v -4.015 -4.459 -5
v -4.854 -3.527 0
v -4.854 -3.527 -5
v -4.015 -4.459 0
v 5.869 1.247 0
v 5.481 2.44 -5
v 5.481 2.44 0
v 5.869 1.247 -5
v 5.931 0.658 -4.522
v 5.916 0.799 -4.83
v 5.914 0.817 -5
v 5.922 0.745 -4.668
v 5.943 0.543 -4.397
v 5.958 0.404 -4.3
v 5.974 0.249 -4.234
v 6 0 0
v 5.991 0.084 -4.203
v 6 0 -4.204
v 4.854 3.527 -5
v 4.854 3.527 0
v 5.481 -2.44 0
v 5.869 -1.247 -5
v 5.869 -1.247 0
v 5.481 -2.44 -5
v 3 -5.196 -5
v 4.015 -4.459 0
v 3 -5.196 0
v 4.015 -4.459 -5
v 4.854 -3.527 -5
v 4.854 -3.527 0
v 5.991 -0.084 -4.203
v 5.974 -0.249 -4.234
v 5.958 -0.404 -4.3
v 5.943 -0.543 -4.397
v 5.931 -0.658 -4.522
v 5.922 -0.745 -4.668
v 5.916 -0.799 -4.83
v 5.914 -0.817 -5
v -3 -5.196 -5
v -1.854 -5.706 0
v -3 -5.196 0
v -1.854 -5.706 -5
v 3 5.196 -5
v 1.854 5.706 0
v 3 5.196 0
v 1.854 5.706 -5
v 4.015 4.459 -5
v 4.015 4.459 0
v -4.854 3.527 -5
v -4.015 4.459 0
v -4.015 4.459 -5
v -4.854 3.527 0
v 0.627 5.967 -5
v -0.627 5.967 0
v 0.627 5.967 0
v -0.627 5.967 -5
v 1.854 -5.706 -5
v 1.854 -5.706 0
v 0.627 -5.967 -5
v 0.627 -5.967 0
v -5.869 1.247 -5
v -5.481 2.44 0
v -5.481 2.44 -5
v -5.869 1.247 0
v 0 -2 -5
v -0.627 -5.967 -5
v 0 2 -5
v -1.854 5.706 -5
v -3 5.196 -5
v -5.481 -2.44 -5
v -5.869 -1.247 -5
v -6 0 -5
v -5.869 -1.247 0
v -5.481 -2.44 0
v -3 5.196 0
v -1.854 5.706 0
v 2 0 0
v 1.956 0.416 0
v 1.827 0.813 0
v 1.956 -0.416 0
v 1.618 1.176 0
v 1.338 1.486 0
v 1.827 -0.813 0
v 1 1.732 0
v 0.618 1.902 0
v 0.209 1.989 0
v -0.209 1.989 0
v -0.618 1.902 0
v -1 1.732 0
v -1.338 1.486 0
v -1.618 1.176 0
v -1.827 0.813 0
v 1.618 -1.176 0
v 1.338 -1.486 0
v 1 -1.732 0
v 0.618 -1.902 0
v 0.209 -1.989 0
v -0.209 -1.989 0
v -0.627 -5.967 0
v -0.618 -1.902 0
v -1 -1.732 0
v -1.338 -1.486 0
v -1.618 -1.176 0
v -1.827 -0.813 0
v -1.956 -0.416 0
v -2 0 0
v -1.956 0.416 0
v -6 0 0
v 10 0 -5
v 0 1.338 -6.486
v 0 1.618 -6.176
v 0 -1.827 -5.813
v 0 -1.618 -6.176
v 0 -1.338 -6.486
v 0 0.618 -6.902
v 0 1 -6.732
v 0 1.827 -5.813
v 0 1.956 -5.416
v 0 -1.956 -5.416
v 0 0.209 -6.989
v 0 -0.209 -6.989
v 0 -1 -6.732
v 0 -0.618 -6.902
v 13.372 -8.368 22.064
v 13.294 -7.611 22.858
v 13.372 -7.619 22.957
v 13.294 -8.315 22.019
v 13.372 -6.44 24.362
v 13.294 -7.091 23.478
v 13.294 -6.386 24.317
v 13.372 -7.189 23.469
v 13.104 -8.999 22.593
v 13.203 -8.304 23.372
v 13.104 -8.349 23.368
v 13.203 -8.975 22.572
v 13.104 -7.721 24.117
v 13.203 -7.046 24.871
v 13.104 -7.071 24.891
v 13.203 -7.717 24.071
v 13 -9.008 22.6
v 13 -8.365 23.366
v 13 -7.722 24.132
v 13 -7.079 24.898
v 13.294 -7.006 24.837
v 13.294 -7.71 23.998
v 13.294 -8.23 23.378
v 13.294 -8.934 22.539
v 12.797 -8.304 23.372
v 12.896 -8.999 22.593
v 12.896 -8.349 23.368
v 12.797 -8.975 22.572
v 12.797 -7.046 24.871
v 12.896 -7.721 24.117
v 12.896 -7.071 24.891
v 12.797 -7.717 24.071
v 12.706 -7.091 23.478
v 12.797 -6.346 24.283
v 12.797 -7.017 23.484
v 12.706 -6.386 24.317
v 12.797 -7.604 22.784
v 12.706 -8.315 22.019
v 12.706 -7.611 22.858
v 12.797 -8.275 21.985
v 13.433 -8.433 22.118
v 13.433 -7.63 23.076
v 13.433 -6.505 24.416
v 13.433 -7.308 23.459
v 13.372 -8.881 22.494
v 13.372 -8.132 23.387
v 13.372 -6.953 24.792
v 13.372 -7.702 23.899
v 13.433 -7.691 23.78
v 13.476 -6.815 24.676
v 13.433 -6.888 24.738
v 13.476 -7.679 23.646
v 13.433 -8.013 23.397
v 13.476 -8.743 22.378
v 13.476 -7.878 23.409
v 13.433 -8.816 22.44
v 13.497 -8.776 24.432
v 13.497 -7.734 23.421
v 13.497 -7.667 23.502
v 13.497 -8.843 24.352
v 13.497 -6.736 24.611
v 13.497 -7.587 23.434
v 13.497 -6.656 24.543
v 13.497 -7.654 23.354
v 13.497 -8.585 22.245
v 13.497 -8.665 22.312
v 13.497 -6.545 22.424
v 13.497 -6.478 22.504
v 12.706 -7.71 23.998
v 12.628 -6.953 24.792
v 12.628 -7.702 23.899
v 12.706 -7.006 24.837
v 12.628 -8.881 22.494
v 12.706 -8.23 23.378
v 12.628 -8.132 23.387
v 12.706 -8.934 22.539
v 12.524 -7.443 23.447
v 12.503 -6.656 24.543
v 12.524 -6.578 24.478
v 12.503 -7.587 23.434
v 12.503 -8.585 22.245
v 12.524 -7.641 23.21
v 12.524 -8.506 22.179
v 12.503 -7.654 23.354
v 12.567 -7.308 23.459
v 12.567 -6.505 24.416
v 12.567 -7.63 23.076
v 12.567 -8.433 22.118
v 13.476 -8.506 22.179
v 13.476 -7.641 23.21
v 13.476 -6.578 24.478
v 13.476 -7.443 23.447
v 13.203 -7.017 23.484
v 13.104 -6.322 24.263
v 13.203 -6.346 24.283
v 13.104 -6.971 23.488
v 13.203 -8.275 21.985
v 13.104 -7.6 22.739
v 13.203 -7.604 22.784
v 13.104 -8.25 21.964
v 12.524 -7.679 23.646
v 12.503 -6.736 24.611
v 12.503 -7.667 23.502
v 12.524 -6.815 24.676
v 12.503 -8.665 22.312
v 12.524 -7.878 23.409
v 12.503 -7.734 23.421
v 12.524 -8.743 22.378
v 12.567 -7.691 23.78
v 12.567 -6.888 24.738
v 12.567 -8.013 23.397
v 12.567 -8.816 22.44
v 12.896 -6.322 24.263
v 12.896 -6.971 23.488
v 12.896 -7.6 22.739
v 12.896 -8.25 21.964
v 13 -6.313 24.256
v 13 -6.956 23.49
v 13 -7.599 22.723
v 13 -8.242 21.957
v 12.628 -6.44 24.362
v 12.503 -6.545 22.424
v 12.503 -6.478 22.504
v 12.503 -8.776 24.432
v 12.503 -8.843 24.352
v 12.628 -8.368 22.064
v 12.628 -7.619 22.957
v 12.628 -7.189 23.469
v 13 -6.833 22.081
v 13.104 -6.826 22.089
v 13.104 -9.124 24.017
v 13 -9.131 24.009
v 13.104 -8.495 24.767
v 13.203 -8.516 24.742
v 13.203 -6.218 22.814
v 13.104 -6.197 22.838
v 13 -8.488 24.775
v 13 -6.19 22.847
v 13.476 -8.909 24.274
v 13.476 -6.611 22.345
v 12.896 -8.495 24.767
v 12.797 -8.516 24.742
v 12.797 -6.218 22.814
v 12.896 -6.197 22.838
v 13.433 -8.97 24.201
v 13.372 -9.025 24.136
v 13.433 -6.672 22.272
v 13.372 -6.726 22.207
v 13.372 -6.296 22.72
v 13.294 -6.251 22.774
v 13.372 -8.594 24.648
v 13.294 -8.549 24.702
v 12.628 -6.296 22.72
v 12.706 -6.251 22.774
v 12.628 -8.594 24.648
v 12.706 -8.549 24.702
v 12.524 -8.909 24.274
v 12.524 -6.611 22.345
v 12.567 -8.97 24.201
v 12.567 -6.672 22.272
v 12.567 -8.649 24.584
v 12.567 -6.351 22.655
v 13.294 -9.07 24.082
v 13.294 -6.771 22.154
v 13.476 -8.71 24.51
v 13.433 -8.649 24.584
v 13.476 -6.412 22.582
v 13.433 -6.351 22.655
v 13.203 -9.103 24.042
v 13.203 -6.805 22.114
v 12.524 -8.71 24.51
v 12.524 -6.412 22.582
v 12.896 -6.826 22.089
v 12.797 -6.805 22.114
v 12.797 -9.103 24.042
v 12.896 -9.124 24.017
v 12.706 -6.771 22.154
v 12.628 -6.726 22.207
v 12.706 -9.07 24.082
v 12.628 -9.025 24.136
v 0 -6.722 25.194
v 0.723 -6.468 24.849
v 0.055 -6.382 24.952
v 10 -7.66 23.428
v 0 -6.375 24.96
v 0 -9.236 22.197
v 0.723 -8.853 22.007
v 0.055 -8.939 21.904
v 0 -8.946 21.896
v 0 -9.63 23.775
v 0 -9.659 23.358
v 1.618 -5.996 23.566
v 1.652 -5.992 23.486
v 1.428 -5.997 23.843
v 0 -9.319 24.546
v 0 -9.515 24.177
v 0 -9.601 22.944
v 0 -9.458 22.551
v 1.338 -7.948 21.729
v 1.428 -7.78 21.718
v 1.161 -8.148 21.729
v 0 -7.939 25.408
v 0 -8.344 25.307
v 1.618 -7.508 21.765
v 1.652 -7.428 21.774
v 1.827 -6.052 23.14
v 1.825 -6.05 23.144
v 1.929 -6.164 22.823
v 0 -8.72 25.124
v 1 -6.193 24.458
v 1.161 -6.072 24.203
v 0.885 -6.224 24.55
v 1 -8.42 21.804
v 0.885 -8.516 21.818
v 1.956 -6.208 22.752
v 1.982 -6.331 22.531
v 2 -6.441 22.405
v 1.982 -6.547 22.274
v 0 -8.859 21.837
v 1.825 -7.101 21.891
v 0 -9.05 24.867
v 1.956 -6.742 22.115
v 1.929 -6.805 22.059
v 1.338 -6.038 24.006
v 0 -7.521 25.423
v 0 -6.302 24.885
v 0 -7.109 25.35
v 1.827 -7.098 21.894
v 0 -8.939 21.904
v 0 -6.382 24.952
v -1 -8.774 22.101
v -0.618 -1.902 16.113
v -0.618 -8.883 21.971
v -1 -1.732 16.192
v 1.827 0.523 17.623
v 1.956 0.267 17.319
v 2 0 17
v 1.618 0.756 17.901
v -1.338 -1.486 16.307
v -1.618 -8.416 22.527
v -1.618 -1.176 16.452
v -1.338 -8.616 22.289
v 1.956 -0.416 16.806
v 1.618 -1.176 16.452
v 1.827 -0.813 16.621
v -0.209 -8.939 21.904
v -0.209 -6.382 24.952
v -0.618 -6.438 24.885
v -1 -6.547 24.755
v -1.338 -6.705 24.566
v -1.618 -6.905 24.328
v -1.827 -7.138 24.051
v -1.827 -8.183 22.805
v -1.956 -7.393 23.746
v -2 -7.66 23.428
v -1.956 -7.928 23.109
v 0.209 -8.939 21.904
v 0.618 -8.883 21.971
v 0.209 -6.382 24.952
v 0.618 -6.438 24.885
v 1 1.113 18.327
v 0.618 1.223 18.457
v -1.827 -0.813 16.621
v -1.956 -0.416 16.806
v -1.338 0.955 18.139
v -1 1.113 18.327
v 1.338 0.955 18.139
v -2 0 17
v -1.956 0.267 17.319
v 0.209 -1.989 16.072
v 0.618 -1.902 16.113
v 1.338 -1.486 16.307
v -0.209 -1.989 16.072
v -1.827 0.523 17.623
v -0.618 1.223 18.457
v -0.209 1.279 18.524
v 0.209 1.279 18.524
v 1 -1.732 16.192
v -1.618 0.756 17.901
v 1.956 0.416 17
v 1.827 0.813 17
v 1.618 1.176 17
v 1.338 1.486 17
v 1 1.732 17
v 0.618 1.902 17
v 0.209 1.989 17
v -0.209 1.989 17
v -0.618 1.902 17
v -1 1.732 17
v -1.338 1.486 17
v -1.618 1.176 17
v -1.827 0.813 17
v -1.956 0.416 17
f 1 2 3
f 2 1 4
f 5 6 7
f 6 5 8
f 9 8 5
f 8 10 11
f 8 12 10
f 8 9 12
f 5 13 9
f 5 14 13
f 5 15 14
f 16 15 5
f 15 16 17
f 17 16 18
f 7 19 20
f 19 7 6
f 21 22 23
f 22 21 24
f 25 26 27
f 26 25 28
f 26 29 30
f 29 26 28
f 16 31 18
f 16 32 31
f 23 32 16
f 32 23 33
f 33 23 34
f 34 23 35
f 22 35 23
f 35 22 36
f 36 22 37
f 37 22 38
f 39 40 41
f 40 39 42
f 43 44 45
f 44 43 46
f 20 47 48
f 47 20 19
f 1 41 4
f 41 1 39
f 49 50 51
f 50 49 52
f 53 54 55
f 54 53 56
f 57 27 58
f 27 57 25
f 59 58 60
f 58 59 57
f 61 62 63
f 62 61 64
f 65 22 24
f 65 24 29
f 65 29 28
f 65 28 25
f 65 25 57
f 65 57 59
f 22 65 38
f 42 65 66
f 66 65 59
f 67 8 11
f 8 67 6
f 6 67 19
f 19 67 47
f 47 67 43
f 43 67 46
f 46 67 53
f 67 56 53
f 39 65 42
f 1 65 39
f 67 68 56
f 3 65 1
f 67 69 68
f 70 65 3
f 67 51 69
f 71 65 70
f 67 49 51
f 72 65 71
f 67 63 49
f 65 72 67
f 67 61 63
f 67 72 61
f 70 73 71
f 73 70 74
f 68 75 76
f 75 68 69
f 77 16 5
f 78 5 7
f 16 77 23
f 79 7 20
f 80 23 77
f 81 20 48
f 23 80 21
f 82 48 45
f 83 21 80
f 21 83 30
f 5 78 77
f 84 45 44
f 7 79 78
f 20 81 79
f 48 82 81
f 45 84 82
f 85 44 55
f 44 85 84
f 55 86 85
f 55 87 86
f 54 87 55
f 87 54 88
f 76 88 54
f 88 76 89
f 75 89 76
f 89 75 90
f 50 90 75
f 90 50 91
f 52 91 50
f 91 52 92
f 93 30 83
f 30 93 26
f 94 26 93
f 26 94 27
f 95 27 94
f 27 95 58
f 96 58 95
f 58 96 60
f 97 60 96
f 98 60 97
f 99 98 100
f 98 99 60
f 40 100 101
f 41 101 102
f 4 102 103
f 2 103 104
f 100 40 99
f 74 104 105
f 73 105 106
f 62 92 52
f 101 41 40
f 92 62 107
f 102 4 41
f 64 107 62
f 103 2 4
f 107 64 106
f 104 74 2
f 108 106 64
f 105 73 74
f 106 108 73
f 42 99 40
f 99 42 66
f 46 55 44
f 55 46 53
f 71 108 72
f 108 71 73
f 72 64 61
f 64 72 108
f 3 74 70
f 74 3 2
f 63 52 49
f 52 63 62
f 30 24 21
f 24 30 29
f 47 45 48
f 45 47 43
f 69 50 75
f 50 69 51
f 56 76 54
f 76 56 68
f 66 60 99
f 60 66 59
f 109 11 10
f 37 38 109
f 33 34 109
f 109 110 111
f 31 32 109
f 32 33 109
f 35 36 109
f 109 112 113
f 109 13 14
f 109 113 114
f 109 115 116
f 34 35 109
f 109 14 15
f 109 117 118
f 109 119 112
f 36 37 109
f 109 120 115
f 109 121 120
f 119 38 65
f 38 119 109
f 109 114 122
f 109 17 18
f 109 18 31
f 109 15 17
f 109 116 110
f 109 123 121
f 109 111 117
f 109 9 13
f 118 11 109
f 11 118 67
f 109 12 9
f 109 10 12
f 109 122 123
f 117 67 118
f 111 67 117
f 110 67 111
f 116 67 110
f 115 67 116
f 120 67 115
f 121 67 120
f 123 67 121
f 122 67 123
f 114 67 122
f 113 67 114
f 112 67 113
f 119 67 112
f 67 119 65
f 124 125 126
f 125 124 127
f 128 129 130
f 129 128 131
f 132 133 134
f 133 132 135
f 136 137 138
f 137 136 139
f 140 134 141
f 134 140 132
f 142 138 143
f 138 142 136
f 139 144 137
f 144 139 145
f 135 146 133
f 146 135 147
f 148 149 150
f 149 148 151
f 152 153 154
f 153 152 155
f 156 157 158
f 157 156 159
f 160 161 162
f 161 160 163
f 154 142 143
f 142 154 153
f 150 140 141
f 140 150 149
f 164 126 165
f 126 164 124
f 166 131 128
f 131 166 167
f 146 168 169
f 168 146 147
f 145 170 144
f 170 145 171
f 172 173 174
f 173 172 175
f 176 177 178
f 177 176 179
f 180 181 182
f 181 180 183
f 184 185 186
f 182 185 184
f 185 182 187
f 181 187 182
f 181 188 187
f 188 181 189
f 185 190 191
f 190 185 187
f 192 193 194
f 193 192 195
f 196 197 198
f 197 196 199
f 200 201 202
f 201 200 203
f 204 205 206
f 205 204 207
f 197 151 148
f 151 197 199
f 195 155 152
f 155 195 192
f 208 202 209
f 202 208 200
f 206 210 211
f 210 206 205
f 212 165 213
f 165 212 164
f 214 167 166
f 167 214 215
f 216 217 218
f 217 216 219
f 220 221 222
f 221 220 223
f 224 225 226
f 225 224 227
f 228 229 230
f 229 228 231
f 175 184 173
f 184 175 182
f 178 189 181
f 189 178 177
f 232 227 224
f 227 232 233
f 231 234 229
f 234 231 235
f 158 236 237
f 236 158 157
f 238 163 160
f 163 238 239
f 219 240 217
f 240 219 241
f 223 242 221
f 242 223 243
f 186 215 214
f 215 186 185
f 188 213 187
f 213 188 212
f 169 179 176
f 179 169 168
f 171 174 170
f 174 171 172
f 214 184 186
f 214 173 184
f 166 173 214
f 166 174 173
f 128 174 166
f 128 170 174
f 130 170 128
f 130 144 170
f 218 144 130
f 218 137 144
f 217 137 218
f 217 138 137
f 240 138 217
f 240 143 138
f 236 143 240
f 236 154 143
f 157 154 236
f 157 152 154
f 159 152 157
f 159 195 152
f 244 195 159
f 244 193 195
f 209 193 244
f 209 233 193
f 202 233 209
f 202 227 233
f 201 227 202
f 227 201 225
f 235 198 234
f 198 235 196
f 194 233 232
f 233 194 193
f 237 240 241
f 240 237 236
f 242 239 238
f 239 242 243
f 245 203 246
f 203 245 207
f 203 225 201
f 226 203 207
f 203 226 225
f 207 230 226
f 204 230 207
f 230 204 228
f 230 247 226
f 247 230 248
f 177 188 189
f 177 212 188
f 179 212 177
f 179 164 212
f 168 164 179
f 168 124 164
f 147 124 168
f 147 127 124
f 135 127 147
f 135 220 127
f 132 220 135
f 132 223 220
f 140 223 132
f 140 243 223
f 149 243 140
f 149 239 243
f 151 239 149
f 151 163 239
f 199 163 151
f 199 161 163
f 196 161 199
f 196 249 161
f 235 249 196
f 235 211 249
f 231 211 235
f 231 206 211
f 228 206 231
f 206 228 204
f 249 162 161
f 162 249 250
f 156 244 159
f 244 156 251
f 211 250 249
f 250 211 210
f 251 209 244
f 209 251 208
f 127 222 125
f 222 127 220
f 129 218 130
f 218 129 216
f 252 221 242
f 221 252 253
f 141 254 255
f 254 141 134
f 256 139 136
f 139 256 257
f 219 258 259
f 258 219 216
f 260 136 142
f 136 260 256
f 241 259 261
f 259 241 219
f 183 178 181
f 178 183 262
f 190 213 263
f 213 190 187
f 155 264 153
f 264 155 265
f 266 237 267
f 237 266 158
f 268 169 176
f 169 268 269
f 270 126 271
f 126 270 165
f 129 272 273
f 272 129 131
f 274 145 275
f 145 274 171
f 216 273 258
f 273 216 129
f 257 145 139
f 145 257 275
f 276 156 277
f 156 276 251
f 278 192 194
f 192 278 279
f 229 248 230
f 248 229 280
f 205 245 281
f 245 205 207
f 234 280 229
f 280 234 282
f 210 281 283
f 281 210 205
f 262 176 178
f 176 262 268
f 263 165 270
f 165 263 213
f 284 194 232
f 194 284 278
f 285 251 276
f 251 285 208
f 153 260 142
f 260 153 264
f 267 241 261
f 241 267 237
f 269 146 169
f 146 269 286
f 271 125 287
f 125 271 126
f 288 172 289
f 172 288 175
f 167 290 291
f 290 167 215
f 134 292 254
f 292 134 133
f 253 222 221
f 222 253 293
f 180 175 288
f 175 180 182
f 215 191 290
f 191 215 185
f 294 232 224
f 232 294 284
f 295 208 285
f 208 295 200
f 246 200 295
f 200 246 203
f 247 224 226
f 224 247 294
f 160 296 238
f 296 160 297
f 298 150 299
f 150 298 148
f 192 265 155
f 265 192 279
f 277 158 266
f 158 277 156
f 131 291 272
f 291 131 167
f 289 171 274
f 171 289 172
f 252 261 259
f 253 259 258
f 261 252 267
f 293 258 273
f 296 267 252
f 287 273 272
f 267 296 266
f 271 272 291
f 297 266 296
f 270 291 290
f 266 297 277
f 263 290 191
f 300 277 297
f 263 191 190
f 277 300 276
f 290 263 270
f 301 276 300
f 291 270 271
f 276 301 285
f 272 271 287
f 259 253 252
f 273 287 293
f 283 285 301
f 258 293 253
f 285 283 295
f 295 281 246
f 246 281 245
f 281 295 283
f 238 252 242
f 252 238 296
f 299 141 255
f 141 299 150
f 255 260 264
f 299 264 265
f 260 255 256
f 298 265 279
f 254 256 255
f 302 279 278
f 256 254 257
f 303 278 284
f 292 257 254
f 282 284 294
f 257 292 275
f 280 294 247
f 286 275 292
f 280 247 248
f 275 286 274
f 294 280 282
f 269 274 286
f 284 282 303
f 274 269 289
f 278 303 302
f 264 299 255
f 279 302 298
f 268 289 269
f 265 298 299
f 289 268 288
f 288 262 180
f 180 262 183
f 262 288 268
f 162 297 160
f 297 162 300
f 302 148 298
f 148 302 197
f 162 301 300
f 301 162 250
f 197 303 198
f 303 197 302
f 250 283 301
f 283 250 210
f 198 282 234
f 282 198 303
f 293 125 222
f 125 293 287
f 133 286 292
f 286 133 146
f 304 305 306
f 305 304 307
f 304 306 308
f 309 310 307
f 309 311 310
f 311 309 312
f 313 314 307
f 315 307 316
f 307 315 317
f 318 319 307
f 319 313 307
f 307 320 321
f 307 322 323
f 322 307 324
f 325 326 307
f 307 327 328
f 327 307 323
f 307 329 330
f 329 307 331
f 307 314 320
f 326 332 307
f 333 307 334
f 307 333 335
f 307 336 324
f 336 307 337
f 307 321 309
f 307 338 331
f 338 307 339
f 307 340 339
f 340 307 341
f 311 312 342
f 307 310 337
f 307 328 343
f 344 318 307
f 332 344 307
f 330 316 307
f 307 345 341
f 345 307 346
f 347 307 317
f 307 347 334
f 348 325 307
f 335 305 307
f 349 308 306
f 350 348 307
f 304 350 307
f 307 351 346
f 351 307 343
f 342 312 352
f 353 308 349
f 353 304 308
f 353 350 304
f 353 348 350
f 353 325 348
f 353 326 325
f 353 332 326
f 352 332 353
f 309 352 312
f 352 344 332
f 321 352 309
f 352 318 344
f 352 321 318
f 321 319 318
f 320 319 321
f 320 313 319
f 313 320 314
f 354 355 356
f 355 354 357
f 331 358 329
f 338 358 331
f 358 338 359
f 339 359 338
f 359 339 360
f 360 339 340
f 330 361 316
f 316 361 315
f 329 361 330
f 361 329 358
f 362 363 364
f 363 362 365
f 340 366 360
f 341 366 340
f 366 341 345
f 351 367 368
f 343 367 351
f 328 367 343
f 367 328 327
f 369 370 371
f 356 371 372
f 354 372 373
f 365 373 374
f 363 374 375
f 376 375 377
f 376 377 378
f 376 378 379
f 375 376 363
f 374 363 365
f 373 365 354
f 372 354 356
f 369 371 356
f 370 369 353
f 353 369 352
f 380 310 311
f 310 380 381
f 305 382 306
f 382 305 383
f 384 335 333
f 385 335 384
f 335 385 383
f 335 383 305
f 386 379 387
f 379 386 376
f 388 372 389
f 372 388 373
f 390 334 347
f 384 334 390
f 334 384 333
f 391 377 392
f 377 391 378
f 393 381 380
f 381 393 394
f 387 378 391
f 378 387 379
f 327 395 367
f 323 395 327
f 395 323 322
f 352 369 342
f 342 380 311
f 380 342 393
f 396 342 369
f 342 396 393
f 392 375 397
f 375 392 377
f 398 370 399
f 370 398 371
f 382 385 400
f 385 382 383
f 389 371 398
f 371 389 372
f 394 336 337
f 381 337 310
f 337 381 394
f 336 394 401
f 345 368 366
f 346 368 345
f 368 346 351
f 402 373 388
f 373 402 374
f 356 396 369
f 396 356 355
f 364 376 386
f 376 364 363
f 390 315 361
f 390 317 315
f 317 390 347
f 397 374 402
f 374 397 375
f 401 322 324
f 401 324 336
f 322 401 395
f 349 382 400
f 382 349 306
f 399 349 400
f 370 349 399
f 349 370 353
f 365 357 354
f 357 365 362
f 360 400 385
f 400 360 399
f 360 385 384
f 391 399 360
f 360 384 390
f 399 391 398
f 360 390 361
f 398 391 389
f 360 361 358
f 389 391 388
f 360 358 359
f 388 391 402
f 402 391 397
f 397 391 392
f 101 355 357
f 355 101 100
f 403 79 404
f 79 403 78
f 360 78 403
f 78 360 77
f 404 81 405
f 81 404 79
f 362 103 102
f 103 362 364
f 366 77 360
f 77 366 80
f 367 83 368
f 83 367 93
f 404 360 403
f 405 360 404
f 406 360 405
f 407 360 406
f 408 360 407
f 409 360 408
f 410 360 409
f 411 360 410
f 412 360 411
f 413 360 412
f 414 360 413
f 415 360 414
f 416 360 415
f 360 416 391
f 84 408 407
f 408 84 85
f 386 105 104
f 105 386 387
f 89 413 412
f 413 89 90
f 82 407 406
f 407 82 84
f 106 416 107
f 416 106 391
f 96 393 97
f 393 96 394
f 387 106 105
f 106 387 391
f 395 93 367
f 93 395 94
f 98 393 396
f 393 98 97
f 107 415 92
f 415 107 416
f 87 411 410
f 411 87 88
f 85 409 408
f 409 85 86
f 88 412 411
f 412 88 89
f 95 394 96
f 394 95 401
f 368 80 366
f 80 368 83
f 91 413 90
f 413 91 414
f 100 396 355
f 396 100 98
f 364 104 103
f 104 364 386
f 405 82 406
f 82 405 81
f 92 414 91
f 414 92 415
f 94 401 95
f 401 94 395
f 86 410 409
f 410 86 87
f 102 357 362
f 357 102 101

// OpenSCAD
$fn=30;

theta1 = 0;
theta2 = 0;

module base() {
	translate([0,0,-5]) {
		cylinder(r=6, h=5);
		rotate([90,0,90]) cylinder(r1 = 2, r2 = 0, h = 10);
	}
}
module j1() {
	cylinder(r=2, h=17);
}

module j2() {
	translate([0,0,17]) rotate([50,0,0]) {
		rotate([0,0,theta2]) {
			cylinder(r=2, h=10);
			translate([0,0,10]) rotate([90,0,90]) {
				cylinder(r1 = 2, r2 = 0, h = 10);
				translate([0,0,13]) cross();
			}
		}
	}
}

base();

rotate([0,0,theta1]) {
	j1();
	j2();
}

module cross() {
	rotate([90,0,90]) cylinder(r=0.5, h = 3, center = true);
	rotate([90,0,0]) cylinder(r=0.5, h = 3, center = true);
}
